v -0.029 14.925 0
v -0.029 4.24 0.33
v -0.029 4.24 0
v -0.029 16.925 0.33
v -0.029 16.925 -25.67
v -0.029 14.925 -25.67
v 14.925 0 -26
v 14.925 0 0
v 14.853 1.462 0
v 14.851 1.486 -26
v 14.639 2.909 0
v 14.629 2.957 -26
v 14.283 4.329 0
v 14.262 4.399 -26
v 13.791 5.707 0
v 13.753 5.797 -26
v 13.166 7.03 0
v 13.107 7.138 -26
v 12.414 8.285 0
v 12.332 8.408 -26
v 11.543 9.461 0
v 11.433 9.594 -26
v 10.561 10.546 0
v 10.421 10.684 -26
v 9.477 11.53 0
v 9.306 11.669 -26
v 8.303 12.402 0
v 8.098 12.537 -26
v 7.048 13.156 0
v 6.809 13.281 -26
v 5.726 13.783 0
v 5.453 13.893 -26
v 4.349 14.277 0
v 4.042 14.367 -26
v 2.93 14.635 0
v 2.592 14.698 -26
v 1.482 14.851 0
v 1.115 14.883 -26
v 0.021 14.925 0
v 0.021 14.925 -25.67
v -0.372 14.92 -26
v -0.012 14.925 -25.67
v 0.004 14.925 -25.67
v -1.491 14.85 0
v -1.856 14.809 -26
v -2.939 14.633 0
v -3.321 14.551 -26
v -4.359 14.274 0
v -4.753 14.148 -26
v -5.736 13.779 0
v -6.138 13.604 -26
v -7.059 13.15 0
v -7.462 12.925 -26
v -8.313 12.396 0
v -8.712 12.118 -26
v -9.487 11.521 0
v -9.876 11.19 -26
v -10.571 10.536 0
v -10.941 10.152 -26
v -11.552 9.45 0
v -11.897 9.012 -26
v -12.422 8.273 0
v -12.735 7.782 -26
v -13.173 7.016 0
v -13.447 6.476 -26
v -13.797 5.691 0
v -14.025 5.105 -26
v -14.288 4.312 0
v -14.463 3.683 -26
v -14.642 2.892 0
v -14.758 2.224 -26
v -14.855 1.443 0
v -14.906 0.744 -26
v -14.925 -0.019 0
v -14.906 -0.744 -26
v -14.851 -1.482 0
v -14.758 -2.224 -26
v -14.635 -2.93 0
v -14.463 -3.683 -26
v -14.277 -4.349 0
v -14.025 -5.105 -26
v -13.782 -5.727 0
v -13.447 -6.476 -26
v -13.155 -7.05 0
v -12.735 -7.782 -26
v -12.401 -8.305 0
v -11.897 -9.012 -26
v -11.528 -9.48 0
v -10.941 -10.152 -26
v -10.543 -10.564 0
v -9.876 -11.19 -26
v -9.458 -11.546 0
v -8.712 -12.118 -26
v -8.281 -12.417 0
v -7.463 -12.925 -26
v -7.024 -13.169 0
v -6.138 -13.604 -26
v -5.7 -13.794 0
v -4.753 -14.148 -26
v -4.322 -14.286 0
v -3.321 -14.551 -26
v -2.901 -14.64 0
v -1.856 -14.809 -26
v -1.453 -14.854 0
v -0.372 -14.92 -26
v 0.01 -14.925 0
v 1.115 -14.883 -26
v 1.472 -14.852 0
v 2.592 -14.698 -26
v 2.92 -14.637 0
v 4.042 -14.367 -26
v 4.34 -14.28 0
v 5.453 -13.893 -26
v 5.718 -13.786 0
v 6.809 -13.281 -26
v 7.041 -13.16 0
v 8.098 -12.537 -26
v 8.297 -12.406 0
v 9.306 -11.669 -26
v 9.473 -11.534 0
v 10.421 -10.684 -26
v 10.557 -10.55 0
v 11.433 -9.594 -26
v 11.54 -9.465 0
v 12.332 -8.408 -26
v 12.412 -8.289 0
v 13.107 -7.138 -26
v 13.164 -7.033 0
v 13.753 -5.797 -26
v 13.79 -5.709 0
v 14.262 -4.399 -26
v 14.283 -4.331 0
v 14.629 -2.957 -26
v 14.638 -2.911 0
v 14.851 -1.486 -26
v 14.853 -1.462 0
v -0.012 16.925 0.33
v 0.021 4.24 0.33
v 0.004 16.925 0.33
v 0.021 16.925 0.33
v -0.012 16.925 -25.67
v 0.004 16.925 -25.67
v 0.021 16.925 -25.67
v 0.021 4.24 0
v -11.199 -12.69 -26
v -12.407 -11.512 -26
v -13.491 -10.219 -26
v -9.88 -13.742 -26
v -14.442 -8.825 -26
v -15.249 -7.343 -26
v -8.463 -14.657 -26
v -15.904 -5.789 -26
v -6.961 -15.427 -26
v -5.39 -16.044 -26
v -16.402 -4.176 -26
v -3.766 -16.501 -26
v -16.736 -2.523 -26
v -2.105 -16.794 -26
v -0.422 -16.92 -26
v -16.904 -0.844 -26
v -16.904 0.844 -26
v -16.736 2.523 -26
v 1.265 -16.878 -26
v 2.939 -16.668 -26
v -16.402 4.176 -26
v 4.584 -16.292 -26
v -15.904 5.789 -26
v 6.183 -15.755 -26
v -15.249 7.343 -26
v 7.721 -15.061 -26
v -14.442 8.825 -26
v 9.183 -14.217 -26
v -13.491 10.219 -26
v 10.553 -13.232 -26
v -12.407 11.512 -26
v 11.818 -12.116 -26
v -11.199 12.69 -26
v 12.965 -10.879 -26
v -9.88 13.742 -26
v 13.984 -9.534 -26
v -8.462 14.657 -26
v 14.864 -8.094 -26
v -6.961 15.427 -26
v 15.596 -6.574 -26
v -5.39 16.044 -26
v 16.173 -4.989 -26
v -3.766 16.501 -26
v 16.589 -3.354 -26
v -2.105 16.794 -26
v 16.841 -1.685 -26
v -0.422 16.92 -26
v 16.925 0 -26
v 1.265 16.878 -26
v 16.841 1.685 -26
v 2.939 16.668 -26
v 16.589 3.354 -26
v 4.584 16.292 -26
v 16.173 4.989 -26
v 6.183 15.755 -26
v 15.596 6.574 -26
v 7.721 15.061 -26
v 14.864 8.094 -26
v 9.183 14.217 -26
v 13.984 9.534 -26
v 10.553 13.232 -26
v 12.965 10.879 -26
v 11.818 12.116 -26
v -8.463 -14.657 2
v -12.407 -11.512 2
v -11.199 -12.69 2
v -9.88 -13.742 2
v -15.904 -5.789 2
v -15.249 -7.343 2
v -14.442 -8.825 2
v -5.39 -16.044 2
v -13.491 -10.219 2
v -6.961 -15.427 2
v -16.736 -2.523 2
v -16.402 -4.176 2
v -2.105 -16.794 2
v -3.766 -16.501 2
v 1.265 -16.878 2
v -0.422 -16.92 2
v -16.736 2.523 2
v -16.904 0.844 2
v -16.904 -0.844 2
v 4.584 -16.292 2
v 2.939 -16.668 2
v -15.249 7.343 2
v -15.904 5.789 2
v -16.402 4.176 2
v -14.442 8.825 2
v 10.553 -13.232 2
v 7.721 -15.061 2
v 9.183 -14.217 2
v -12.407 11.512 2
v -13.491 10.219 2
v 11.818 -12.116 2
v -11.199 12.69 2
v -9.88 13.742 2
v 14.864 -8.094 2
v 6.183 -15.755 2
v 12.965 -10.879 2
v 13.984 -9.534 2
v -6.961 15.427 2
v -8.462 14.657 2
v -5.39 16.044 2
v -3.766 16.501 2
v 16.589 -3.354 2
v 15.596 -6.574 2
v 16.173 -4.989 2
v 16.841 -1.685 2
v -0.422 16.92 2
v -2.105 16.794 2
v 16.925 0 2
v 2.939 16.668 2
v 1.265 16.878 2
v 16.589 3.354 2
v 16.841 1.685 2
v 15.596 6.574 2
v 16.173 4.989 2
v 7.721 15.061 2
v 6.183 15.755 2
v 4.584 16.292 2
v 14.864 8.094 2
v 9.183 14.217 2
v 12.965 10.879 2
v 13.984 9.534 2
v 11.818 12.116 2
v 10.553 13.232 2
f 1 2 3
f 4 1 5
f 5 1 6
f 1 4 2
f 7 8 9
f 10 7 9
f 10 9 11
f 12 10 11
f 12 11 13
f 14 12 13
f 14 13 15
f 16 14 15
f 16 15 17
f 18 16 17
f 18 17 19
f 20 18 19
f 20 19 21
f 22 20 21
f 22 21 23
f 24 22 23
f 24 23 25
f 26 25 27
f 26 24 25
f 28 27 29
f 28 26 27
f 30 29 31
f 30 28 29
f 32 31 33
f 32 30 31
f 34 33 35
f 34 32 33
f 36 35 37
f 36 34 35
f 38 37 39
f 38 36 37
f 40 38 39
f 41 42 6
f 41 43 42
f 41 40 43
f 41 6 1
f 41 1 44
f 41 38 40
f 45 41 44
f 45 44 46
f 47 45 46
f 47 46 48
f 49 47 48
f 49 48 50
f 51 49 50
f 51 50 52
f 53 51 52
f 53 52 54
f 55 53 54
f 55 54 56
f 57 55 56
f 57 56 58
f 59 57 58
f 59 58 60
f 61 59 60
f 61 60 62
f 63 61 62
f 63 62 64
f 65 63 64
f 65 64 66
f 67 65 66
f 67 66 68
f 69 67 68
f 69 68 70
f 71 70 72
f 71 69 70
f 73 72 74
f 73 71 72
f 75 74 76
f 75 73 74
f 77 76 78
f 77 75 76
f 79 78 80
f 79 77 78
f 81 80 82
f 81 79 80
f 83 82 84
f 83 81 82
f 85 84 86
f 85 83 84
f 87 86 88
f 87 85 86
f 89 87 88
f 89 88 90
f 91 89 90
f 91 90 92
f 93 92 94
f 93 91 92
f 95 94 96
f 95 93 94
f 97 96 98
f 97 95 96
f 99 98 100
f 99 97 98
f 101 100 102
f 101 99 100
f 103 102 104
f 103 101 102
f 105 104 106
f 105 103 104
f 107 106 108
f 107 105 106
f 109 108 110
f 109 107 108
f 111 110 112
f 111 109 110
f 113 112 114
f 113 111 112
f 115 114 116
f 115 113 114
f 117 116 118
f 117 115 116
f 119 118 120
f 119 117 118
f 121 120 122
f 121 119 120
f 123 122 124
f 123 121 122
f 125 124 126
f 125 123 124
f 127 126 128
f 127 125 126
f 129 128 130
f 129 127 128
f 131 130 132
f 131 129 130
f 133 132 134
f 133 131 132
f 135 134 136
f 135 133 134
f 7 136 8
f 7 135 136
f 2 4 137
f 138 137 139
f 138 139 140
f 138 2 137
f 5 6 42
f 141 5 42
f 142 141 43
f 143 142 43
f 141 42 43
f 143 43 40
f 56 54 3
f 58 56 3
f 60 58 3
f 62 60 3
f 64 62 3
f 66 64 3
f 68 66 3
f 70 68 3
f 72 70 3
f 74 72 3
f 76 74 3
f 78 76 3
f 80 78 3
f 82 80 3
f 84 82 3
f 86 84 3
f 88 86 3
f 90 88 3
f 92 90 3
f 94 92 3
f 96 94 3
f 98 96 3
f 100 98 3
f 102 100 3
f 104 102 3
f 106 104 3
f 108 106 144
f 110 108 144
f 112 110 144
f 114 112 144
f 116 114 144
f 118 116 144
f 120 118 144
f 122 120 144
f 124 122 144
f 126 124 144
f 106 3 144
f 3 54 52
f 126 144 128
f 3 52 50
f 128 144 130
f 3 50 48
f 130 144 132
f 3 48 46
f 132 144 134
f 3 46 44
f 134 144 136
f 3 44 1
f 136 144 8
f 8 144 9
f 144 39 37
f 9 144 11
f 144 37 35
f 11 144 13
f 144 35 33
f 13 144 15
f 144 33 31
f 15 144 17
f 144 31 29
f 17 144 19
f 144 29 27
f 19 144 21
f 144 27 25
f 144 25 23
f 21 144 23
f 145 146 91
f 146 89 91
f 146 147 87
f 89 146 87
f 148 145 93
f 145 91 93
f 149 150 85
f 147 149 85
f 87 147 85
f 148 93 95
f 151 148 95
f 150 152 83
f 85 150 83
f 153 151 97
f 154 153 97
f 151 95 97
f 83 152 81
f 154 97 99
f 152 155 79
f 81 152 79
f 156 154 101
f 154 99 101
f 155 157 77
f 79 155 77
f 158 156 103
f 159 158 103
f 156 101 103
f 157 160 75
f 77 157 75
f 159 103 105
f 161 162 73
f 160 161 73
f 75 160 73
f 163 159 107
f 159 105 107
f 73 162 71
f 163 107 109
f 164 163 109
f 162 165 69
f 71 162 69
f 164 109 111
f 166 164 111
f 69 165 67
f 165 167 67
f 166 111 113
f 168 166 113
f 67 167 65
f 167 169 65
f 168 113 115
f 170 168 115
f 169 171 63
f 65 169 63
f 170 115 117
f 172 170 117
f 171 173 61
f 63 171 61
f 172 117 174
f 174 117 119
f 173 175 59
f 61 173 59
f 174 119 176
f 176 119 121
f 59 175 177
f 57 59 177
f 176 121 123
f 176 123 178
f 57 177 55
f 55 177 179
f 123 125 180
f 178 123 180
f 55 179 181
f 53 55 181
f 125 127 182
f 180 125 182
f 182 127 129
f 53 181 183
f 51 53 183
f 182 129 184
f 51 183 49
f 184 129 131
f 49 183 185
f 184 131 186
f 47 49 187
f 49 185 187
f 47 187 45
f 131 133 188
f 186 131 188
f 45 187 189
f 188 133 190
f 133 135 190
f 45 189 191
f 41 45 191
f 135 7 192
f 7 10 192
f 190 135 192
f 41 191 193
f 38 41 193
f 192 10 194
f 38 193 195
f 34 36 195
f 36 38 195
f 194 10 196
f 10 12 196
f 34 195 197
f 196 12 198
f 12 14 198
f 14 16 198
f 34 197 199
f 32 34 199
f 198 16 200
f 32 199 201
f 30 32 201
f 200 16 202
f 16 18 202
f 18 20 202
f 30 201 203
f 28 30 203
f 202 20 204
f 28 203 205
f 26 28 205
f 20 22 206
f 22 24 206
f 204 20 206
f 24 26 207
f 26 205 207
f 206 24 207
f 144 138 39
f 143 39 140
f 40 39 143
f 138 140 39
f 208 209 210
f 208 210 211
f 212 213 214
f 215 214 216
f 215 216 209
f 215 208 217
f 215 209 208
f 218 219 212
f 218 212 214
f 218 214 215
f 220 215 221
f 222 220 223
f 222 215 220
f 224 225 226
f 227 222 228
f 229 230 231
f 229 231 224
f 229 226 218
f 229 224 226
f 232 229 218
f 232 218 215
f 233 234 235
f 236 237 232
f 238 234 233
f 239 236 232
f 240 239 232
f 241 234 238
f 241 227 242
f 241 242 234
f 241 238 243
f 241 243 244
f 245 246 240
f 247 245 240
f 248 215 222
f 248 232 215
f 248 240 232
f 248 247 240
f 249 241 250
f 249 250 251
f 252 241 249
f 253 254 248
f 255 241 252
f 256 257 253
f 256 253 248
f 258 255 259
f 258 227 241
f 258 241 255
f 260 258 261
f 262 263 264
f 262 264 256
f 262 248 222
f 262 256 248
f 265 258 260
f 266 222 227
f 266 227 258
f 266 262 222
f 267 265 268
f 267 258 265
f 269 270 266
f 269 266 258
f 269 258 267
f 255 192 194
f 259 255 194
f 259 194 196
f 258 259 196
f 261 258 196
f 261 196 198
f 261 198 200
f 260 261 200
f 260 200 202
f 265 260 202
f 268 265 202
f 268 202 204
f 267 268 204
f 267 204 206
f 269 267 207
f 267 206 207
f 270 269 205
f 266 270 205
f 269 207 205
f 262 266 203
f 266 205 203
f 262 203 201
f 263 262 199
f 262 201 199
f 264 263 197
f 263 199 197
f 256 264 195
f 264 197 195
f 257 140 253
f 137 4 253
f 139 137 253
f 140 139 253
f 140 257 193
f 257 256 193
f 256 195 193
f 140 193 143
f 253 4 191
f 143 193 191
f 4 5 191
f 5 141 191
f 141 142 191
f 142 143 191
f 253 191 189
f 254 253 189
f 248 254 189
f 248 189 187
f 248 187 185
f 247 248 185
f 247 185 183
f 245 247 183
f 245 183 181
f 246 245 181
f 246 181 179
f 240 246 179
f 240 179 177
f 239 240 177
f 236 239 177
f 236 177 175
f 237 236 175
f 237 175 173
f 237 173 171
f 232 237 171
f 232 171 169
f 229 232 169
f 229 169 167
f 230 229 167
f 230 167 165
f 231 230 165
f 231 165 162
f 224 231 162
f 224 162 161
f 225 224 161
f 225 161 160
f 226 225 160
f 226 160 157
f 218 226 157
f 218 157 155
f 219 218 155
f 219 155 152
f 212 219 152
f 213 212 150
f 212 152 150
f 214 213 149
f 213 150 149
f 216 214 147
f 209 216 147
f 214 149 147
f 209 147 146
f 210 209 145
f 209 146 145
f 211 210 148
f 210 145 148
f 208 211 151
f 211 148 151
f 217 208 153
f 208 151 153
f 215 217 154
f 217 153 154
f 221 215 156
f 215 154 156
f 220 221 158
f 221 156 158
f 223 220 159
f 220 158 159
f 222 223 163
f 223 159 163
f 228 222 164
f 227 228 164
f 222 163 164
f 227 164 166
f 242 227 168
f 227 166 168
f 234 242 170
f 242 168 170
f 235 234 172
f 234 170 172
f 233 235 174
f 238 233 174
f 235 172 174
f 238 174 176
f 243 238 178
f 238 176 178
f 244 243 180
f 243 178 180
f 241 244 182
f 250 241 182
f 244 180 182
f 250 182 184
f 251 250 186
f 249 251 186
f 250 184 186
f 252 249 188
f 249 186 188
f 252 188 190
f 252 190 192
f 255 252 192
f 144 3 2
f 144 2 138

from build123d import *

# Parameters (mm, degrees)
SKETCH_1_R          = 14.925
EXTRUDE_1_DEPTH     = 2
EXTRUDE_START       = -28
SKETCH_2_R          = 16.925
SKETCH_2_R_2        = 14.925
EXTRUDE_2_DEPTH     = 28
SKETCH_3_W          = 0.05
SKETCH_3_H          = 26
CUT_EXTRUDE_1_DEPTH = 27


with BuildPart() as part:
    # Эскиз1 → Бобышка-Вытянуть1 (new body)
    with BuildSketch(Plane.XY):
        Circle(SKETCH_1_R)
    extrude(amount=EXTRUDE_1_DEPTH)

    # Эскиз2 → Бобышка-Вытянуть2 (add)
    with BuildSketch(Plane.XY.offset(2).offset(EXTRUDE_START)):
        Circle(SKETCH_2_R)
        Circle(SKETCH_2_R_2, mode=Mode.SUBTRACT)
    extrude(amount=EXTRUDE_2_DEPTH)

    # Эскиз3 → Вырез-Вытянуть1 (cut)
    with BuildSketch(Plane(origin=(-4.399906999, 4.240400233, -22), x_dir=(1, 0, 0), z_dir=(0, 1, 0))):
        with Locations((4.39587448, -9.32957199)):
            Rectangle(SKETCH_3_W, SKETCH_3_H)
    extrude(amount=CUT_EXTRUDE_1_DEPTH, mode=Mode.SUBTRACT)


solid = part.part
